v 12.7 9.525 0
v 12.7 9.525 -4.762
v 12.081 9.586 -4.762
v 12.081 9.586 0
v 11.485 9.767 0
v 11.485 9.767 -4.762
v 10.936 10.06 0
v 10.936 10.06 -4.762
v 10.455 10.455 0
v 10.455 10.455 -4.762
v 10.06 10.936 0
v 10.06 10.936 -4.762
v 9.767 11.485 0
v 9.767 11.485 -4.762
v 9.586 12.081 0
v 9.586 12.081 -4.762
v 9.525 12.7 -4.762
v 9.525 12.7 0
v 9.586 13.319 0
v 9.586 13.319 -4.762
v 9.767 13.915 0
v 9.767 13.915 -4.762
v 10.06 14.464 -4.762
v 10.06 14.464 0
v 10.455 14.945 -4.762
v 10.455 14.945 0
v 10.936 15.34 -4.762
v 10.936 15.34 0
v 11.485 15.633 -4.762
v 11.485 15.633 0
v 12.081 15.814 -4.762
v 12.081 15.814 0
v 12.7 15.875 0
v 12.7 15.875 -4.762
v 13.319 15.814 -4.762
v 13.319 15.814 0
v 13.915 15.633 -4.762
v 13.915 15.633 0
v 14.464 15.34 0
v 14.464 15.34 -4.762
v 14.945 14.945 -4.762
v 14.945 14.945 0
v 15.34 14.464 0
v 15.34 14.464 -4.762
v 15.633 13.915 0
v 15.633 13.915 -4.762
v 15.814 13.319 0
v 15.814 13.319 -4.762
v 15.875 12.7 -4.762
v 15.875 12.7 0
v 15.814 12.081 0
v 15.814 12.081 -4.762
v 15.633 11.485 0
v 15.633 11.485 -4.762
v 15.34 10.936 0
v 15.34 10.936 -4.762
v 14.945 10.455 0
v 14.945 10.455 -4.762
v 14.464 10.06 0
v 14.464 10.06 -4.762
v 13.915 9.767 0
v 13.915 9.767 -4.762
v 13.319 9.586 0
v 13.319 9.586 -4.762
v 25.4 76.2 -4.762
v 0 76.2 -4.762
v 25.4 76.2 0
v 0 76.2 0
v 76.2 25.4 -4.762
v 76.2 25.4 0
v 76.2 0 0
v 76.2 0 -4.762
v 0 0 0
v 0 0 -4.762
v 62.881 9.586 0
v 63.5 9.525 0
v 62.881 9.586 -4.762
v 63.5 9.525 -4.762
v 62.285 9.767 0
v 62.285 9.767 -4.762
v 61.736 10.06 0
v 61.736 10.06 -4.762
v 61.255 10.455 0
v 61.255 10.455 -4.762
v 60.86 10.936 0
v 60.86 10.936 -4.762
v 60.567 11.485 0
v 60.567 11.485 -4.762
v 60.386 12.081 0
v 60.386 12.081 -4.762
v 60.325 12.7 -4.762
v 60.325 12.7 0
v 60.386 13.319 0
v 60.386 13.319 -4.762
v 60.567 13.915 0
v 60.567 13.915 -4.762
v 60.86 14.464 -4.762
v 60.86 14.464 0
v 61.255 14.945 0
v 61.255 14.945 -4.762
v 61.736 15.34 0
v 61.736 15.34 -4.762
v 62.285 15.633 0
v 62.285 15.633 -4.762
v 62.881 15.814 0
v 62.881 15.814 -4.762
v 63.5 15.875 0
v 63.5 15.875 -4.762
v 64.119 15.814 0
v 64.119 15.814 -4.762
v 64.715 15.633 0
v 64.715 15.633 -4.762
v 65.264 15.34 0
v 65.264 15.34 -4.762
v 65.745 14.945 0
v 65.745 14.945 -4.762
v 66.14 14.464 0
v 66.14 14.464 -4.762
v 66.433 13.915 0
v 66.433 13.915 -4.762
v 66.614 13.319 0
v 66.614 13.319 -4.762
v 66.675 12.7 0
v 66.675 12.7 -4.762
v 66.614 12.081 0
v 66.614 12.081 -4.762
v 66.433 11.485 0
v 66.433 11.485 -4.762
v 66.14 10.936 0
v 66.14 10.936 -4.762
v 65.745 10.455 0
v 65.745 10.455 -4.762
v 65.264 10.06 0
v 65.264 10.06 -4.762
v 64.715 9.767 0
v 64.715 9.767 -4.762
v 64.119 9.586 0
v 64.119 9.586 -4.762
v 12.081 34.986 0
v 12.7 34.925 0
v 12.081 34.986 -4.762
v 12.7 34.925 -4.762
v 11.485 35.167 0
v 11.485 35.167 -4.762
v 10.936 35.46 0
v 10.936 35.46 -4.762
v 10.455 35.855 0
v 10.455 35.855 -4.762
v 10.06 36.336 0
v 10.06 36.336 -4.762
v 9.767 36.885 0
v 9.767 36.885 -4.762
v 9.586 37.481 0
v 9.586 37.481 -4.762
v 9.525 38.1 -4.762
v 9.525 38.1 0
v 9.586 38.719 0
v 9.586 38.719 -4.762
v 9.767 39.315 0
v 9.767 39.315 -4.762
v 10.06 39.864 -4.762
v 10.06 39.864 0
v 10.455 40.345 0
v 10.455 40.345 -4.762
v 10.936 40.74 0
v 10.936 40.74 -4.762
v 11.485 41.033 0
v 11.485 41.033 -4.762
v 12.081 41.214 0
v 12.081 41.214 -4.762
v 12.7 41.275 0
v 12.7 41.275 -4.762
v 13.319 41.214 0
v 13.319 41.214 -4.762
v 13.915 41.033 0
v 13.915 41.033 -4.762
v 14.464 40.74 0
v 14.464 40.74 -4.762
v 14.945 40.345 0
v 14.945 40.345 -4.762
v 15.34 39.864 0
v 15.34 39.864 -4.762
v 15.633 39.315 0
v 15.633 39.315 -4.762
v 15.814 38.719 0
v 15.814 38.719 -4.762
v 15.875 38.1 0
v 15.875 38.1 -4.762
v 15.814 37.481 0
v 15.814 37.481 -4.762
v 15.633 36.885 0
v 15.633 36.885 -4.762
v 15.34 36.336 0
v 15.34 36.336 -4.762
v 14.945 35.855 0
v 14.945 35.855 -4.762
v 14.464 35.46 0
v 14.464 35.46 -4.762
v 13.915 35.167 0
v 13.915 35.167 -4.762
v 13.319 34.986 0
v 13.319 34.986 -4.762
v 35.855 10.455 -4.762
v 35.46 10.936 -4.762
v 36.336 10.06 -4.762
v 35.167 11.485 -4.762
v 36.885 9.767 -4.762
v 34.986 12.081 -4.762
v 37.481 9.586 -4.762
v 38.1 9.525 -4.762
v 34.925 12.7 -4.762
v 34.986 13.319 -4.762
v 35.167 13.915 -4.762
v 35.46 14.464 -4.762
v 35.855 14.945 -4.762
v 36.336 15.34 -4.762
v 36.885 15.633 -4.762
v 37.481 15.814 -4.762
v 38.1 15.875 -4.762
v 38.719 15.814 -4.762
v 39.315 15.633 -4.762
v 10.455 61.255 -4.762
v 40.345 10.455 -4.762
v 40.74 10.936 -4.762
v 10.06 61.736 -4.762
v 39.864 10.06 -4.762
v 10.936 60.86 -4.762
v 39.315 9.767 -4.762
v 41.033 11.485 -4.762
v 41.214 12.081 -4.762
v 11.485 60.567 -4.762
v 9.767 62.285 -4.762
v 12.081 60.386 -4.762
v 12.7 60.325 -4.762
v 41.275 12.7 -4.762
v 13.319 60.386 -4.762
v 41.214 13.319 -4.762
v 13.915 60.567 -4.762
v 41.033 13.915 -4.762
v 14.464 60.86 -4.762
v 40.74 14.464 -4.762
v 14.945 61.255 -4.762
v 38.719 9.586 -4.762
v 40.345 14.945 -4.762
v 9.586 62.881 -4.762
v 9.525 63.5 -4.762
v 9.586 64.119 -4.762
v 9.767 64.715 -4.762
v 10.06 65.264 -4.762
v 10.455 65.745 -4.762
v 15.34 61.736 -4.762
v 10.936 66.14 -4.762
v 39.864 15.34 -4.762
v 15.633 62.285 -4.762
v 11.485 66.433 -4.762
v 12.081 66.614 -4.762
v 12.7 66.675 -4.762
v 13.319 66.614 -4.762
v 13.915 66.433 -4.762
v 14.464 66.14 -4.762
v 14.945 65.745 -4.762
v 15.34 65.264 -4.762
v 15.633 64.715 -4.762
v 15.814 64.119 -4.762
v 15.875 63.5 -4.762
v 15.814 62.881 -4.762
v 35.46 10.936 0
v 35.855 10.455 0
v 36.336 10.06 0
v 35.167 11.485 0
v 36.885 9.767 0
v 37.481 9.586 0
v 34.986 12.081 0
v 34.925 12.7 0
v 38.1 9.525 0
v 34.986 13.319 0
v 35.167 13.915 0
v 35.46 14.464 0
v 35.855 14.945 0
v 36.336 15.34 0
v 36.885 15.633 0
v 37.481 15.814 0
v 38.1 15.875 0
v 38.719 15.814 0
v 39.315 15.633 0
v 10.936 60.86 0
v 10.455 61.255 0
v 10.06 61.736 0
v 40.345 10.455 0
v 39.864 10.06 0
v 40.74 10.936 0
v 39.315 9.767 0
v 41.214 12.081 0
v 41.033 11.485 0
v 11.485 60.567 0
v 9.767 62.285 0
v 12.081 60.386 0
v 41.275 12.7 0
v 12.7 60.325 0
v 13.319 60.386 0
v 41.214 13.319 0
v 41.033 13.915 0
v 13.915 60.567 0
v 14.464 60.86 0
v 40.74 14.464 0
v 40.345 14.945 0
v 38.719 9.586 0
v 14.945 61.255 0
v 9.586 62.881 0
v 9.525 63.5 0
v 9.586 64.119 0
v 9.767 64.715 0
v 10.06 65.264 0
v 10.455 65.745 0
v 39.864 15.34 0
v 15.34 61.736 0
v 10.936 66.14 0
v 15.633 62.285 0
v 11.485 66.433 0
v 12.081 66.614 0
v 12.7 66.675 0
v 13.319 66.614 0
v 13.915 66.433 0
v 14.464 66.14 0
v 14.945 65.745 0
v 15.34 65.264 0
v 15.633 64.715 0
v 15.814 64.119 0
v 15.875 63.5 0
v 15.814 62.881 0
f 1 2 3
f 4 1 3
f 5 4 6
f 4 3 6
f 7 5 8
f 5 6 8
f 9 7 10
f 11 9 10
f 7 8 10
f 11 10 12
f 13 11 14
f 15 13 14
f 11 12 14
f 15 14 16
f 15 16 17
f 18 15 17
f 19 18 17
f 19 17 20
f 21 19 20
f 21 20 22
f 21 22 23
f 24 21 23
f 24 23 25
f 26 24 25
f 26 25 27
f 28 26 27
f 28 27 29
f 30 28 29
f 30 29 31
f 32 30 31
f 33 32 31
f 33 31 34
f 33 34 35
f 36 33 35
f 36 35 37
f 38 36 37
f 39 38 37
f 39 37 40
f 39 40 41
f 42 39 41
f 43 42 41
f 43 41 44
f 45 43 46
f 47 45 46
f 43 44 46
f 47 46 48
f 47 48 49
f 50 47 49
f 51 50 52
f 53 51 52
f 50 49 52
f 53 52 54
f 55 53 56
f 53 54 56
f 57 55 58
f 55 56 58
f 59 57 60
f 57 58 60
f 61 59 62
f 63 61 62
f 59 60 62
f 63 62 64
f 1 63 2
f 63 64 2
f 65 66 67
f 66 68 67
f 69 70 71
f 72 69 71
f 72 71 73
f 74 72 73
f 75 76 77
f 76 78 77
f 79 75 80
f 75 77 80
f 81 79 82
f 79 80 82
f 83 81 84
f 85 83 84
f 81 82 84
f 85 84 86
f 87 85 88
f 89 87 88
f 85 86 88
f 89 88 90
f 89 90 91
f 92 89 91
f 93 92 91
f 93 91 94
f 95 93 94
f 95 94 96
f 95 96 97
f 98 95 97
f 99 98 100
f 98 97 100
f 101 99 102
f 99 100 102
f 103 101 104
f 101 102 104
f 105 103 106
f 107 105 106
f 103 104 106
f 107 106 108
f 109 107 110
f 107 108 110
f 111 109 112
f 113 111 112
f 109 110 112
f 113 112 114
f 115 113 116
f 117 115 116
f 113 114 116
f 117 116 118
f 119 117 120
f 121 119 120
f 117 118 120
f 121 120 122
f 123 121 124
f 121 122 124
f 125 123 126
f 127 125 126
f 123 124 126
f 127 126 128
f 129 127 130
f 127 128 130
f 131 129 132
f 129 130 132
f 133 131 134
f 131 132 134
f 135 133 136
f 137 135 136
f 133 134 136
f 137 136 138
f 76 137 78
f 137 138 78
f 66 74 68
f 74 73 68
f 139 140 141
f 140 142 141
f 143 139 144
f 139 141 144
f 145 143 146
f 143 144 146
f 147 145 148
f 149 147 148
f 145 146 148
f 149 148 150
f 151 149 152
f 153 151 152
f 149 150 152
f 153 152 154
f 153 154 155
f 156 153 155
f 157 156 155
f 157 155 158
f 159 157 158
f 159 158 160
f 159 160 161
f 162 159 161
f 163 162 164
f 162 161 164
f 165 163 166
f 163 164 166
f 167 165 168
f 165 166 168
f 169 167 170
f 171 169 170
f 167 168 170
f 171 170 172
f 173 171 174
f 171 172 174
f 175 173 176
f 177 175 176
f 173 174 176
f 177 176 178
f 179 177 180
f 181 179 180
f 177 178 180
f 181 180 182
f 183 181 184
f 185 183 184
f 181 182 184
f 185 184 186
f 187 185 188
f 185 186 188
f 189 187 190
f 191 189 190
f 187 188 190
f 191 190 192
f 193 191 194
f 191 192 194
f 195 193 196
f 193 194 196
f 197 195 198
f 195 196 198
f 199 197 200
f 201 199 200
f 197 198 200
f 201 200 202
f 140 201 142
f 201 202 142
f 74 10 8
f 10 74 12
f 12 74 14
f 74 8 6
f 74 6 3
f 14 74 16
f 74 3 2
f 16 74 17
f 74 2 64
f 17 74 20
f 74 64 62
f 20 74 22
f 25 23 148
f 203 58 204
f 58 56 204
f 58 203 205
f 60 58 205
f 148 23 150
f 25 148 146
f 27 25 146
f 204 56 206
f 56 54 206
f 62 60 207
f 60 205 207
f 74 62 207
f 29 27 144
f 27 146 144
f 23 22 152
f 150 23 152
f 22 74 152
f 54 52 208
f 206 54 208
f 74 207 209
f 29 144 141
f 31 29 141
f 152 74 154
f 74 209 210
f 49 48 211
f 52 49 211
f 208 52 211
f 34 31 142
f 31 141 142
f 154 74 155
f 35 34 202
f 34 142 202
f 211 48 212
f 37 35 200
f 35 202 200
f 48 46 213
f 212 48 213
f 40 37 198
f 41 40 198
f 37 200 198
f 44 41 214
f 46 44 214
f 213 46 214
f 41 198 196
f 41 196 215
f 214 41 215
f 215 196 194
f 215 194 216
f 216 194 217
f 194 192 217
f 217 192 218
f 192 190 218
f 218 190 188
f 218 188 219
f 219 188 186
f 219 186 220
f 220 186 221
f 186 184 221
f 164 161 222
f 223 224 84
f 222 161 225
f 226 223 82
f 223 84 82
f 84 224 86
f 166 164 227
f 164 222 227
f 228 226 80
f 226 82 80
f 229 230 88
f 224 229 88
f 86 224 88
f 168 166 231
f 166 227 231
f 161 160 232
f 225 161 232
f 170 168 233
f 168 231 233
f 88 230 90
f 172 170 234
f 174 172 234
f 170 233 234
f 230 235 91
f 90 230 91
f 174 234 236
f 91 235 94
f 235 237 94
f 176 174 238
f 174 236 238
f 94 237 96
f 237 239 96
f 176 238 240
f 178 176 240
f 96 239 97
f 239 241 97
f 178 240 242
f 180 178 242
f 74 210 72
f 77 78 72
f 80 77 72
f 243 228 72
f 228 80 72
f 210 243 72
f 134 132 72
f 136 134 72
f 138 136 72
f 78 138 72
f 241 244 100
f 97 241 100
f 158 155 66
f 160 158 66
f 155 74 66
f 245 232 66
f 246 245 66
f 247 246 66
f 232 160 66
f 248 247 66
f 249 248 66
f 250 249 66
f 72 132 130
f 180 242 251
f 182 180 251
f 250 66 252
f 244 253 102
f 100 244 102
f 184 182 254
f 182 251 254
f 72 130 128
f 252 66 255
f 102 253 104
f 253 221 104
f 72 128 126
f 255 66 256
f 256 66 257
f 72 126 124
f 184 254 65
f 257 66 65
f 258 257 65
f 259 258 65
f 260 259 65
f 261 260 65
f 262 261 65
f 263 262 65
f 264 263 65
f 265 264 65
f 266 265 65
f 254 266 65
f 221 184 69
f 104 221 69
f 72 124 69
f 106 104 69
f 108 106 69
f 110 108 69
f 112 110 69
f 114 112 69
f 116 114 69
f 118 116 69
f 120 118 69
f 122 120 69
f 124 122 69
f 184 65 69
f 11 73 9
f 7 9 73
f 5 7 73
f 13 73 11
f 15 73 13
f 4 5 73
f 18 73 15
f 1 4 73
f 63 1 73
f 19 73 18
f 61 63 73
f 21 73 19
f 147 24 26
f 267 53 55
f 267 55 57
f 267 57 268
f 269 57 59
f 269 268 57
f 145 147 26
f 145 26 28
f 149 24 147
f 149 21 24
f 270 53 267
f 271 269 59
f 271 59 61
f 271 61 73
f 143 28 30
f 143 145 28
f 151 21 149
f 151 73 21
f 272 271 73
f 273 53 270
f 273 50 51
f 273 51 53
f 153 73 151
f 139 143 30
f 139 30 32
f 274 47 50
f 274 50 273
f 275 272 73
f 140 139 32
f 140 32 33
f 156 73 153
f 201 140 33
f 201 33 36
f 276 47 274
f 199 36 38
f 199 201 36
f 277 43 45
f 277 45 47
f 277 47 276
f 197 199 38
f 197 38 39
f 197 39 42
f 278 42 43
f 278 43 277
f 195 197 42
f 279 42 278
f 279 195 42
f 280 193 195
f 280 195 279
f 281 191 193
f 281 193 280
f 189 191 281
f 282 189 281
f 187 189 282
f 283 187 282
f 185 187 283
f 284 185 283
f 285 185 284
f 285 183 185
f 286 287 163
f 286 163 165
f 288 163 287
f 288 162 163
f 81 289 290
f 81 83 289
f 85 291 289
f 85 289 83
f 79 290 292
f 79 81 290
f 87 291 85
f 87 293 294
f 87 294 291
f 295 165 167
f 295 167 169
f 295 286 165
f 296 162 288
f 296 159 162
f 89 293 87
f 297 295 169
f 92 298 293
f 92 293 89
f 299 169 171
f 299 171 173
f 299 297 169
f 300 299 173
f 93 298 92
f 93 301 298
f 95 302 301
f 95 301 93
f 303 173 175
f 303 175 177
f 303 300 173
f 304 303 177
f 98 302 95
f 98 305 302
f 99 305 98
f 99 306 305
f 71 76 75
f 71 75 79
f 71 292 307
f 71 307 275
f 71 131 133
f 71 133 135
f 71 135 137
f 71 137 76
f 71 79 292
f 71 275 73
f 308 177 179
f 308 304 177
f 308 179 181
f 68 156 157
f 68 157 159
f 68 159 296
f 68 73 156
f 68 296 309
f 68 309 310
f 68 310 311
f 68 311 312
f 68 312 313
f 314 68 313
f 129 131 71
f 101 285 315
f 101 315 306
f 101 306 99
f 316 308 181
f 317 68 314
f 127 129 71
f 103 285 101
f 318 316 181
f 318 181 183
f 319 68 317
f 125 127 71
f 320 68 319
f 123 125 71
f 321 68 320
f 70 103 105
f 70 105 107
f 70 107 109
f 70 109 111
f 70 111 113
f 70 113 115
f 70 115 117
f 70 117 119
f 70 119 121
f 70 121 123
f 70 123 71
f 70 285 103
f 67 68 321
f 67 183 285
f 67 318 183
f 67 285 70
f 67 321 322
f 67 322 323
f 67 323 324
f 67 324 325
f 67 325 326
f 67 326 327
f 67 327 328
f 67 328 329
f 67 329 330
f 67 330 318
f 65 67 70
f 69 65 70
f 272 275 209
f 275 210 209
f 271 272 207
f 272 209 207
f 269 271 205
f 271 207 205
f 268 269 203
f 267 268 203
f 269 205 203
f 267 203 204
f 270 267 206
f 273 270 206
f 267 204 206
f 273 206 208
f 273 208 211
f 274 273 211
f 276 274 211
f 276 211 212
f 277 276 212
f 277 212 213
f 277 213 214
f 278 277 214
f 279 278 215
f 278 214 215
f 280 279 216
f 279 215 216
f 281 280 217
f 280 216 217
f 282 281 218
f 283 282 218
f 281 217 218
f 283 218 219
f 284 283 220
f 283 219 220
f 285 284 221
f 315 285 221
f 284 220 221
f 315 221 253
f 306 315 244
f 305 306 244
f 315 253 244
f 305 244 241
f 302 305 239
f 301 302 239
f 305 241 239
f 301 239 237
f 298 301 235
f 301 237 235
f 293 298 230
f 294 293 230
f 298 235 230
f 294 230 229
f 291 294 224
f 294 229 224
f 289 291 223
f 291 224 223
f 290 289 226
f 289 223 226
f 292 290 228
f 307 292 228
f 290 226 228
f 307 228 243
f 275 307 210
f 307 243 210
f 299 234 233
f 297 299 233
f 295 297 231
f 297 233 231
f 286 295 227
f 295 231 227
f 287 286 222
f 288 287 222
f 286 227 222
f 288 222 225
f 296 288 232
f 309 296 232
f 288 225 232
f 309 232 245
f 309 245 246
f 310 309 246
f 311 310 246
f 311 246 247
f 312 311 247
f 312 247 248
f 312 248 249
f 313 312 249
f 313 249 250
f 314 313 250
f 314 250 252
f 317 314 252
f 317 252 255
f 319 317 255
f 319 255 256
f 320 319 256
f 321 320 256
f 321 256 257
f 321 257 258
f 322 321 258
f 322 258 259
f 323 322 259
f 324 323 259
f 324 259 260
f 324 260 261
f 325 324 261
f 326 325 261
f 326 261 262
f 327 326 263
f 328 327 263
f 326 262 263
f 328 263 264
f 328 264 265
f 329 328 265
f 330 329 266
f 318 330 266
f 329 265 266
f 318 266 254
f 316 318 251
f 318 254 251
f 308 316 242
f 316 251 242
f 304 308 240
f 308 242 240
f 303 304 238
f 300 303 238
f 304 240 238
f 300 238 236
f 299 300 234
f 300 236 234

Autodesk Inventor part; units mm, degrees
ref_plane "YZ Plane" through (0, 0, 0) normal (1, 0, 0) x (0, 1, 0)
ref_plane "XZ Plane" through (0, 0, 0) normal (0, 1, 0) x (-1, 0, 0)
ref_plane "XY Plane" through (0, 0, 0) normal (0, 0, 1) x (1, 0, 0)
sketch "Sketch1" plane through (0, 0, 0) normal (0, 0, 1) x (1, 0, 0)
  line L0 (76.2, 0) -> (0, 0)
  line L1 (0, 0) -> (0, 76.2)
  line L2 (0, 76.2) -> (25.4, 76.2)
  line L3 (25.4, 76.2) -> (76.2, 25.4)
  line L4 (76.2, 25.4) -> (76.2, 0)
  point P0 (12.7, 63.5)
  point P1 (12.7, 38.1)
  point P2 (12.7, 12.7)
  point P3 (38.1, 12.7)
  point P4 (63.5, 12.7)
  dimension "d0" = 76.2
  dimension "d1" = 76.2
  dimension "d2" = 25.4
  dimension "d3" = 25.4
  dimension "d4" = 12.7
  dimension "d5" = 12.7
  dimension "d6" = 25.4
  dimension "d7" = 25.4
  dimension "d8" = 25.4
  dimension "d9" = 25.4
extrude "Extrusion1" add sketch "Sketch1" against normal blind 4.7625
hole "Hole1" at (12.7, 63.5, 0) at (12.7, 38.1, 0) at (12.7, 12.7, 0) at (38.1, 12.7, 0) at (63.5, 12.7, 0) direction (0, 0, -1) diameter 6.35 depth 25.4 tip angle 118
properties part number "8020_gussetplate"
